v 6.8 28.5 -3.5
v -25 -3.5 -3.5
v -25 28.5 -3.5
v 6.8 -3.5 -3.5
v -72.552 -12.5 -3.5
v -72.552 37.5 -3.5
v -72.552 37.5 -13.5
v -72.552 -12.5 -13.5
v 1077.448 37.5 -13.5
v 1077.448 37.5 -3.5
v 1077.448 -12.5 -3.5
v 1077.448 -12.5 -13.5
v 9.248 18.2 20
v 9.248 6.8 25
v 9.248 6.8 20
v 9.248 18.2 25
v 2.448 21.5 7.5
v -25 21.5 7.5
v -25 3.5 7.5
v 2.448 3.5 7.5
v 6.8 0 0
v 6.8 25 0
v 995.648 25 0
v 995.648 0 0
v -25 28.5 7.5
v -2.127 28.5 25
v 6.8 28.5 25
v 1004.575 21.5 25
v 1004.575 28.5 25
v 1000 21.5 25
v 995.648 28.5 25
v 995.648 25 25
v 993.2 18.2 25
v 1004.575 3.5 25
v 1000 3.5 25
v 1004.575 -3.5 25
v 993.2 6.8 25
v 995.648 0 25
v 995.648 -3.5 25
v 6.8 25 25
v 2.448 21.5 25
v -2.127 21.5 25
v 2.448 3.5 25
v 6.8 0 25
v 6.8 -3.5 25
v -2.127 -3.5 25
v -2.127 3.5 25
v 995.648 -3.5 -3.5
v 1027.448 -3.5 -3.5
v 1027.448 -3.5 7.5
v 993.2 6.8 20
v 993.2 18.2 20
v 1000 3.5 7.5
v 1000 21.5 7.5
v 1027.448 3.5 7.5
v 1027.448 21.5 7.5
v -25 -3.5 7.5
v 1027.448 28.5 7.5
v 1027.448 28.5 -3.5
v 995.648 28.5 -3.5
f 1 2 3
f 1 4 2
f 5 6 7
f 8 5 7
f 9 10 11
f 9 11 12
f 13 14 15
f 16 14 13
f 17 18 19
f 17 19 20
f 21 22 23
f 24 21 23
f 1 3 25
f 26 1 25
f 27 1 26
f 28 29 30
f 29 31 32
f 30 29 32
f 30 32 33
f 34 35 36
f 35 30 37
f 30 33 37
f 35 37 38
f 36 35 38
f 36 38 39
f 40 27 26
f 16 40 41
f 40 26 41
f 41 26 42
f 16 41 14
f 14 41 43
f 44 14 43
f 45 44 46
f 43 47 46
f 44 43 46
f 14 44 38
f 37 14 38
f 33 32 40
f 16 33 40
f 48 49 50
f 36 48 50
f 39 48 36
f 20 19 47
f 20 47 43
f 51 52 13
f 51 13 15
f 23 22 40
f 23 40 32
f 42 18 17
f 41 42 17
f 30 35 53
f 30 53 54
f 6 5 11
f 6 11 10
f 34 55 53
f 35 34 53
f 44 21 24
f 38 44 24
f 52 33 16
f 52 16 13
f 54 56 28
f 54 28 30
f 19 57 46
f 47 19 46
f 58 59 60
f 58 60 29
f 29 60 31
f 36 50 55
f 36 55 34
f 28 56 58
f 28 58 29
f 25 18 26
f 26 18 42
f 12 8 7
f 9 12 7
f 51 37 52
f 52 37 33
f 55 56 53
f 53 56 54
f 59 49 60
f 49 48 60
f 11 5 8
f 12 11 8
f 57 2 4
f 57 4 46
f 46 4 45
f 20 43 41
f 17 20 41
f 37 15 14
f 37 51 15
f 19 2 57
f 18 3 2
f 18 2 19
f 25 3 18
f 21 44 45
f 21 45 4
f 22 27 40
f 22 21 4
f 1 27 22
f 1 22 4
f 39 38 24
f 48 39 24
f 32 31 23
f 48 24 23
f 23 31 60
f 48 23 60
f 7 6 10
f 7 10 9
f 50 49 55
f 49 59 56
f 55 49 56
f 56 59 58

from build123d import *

# Parameters (mm, degrees)
SKETCH1_W                = 1000
SKETCH1_H                = 25
BOSS_EXTRUDE1_DEPTH      = 25
SKETCH2_W                = 986.4
SKETCH2_H                = 11.4
CUT_EXTRUDE2_DEPTH       = 5
SKETCH4_W                = 32
SKETCH4_H                = 32
SKETCH4_W_2              = 25
SKETCH4_H_2              = 25
BOSS_EXTRUDE2_DEPTH      = 6.8
SKETCH5_W                = 32
SKETCH5_H                = 32
BOSS_EXTRUDE3_DEPTH      = 25
SKETCH6_W                = 27.448100552
SKETCH6_H                = 18
CUT_EXTRUDE3_DEPTH       = 21
CUT_EXTRUDE4_DEPTH       = 43
CUT_EXTRUDE5_DEPTH       = 43
CUT_EXTRUDE5_DEPTH_BACK  = 413
BOSS_EXTRUDE5_DEPTH      = 50
BOSS_EXTRUDE5_DEPTH_BACK = 1100
SKETCH10_W               = 10
SKETCH10_H               = 50


with BuildPart() as part:
    # Sketch1 → Boss-Extrude1 (new body)
    with BuildSketch(Plane.XY):
        with Locations((500, 12.5)):
            Rectangle(SKETCH1_W, SKETCH1_H)
    extrude(amount=BOSS_EXTRUDE1_DEPTH)

    # Sketch2 → Cut-Extrude2 (cut)
    with BuildSketch(Plane.XY.offset(25)):
        with Locations((500, 12.5)):
            Rectangle(SKETCH2_W, SKETCH2_H)
    extrude(amount=-CUT_EXTRUDE2_DEPTH, mode=Mode.SUBTRACT)



with BuildPart() as body_2:
    # Sketch4 → Boss-Extrude2 (new body)
    with BuildSketch(Plane(origin=(6.8, 0, 0), x_dir=(0, 0, -1), z_dir=(1, 0, 0))):
        with Locations((-12.5, 12.5)):
            Rectangle(SKETCH4_W, SKETCH4_H)
        with Locations((-12.5, 12.5)):
            Rectangle(SKETCH4_W_2, SKETCH4_H_2, mode=Mode.SUBTRACT)
    extrude(amount=-BOSS_EXTRUDE2_DEPTH)


with BuildPart() as part_1:
    add(part.part)

    add(body_2.part)  # Boss-Extrude3 merges body 2
    # Sketch5 → Boss-Extrude3 (add)
    with BuildSketch(Plane.ZY):
        with Locations((12.5, 12.5)):
            Rectangle(SKETCH5_W, SKETCH5_H)
    extrude(amount=BOSS_EXTRUDE3_DEPTH)

    # Sketch6 → Cut-Extrude3 (cut)
    with BuildSketch(Plane.XY.offset(28.5)):
        with Locations((-11.275949724, 12.5)):
            Rectangle(SKETCH6_W, SKETCH6_H)
    extrude(amount=-CUT_EXTRUDE3_DEPTH, mode=Mode.SUBTRACT)

    # Sketch7 → Cut-Extrude4 (cut)
    with BuildSketch(Plane.XZ.offset(3.5)):
        Polygon((2.448100552, 28.5), (-25, 28.5), (-25, 7.5), align=None)
    extrude(amount=-CUT_EXTRUDE4_DEPTH, mode=Mode.SUBTRACT)

    # Sketch8 → Cut-Extrude5 (cut, two sides: drawn at the far end of the back side and taken through both)
    with BuildSketch(Plane.ZY.offset(-2.448100552).offset(-CUT_EXTRUDE5_DEPTH_BACK)):
        with BuildLine():
            Line((20, 6.8), (23, 6.8))
            ThreePointArc((23, 6.8), (24.414213562, 6.214213562), (25, 4.8))
            Line((25, 4.8), (25, -5.020840196))
            Line((25, -5.020840196), (31.991589763, -5.020840196))
            Line((31.991589763, -5.020840196), (31.991589763, 30.746420452))
            Line((31.991589763, 30.746420452), (25, 30.746420452))
            Line((25, 30.746420452), (25, 20.2))
            ThreePointArc((25, 20.2), (24.414213562, 18.785786438), (23, 18.2))
            Line((23, 18.2), (20, 18.2))
            Line((20, 18.2), (20, 6.8))
        make_face()
    extrude(amount=CUT_EXTRUDE5_DEPTH + CUT_EXTRUDE5_DEPTH_BACK, mode=Mode.SUBTRACT)

    # Mirror6: part across plane


with BuildPart() as part_2:
    add(part_1.part)
    add(part_1.part.mirror(Plane(origin=(501.224050276, 0, 0), x_dir=(0, 0, 1), z_dir=(1, 0, 0))))


with BuildPart() as body_2_2:
    # Sketch10 → Boss-Extrude5 (new, two sides: drawn at the far end of the back side and taken through both)
    with BuildSketch(Plane(origin=(1027.448100552, 0, 0), x_dir=(0, 0, -1), z_dir=(1, 0, 0)).offset(-BOSS_EXTRUDE5_DEPTH_BACK)):
        with Locations((8.5, 12.5)):
            Rectangle(SKETCH10_W, SKETCH10_H)
    extrude(amount=BOSS_EXTRUDE5_DEPTH + BOSS_EXTRUDE5_DEPTH_BACK)


solid = Compound([part_2.part, body_2_2.part])
